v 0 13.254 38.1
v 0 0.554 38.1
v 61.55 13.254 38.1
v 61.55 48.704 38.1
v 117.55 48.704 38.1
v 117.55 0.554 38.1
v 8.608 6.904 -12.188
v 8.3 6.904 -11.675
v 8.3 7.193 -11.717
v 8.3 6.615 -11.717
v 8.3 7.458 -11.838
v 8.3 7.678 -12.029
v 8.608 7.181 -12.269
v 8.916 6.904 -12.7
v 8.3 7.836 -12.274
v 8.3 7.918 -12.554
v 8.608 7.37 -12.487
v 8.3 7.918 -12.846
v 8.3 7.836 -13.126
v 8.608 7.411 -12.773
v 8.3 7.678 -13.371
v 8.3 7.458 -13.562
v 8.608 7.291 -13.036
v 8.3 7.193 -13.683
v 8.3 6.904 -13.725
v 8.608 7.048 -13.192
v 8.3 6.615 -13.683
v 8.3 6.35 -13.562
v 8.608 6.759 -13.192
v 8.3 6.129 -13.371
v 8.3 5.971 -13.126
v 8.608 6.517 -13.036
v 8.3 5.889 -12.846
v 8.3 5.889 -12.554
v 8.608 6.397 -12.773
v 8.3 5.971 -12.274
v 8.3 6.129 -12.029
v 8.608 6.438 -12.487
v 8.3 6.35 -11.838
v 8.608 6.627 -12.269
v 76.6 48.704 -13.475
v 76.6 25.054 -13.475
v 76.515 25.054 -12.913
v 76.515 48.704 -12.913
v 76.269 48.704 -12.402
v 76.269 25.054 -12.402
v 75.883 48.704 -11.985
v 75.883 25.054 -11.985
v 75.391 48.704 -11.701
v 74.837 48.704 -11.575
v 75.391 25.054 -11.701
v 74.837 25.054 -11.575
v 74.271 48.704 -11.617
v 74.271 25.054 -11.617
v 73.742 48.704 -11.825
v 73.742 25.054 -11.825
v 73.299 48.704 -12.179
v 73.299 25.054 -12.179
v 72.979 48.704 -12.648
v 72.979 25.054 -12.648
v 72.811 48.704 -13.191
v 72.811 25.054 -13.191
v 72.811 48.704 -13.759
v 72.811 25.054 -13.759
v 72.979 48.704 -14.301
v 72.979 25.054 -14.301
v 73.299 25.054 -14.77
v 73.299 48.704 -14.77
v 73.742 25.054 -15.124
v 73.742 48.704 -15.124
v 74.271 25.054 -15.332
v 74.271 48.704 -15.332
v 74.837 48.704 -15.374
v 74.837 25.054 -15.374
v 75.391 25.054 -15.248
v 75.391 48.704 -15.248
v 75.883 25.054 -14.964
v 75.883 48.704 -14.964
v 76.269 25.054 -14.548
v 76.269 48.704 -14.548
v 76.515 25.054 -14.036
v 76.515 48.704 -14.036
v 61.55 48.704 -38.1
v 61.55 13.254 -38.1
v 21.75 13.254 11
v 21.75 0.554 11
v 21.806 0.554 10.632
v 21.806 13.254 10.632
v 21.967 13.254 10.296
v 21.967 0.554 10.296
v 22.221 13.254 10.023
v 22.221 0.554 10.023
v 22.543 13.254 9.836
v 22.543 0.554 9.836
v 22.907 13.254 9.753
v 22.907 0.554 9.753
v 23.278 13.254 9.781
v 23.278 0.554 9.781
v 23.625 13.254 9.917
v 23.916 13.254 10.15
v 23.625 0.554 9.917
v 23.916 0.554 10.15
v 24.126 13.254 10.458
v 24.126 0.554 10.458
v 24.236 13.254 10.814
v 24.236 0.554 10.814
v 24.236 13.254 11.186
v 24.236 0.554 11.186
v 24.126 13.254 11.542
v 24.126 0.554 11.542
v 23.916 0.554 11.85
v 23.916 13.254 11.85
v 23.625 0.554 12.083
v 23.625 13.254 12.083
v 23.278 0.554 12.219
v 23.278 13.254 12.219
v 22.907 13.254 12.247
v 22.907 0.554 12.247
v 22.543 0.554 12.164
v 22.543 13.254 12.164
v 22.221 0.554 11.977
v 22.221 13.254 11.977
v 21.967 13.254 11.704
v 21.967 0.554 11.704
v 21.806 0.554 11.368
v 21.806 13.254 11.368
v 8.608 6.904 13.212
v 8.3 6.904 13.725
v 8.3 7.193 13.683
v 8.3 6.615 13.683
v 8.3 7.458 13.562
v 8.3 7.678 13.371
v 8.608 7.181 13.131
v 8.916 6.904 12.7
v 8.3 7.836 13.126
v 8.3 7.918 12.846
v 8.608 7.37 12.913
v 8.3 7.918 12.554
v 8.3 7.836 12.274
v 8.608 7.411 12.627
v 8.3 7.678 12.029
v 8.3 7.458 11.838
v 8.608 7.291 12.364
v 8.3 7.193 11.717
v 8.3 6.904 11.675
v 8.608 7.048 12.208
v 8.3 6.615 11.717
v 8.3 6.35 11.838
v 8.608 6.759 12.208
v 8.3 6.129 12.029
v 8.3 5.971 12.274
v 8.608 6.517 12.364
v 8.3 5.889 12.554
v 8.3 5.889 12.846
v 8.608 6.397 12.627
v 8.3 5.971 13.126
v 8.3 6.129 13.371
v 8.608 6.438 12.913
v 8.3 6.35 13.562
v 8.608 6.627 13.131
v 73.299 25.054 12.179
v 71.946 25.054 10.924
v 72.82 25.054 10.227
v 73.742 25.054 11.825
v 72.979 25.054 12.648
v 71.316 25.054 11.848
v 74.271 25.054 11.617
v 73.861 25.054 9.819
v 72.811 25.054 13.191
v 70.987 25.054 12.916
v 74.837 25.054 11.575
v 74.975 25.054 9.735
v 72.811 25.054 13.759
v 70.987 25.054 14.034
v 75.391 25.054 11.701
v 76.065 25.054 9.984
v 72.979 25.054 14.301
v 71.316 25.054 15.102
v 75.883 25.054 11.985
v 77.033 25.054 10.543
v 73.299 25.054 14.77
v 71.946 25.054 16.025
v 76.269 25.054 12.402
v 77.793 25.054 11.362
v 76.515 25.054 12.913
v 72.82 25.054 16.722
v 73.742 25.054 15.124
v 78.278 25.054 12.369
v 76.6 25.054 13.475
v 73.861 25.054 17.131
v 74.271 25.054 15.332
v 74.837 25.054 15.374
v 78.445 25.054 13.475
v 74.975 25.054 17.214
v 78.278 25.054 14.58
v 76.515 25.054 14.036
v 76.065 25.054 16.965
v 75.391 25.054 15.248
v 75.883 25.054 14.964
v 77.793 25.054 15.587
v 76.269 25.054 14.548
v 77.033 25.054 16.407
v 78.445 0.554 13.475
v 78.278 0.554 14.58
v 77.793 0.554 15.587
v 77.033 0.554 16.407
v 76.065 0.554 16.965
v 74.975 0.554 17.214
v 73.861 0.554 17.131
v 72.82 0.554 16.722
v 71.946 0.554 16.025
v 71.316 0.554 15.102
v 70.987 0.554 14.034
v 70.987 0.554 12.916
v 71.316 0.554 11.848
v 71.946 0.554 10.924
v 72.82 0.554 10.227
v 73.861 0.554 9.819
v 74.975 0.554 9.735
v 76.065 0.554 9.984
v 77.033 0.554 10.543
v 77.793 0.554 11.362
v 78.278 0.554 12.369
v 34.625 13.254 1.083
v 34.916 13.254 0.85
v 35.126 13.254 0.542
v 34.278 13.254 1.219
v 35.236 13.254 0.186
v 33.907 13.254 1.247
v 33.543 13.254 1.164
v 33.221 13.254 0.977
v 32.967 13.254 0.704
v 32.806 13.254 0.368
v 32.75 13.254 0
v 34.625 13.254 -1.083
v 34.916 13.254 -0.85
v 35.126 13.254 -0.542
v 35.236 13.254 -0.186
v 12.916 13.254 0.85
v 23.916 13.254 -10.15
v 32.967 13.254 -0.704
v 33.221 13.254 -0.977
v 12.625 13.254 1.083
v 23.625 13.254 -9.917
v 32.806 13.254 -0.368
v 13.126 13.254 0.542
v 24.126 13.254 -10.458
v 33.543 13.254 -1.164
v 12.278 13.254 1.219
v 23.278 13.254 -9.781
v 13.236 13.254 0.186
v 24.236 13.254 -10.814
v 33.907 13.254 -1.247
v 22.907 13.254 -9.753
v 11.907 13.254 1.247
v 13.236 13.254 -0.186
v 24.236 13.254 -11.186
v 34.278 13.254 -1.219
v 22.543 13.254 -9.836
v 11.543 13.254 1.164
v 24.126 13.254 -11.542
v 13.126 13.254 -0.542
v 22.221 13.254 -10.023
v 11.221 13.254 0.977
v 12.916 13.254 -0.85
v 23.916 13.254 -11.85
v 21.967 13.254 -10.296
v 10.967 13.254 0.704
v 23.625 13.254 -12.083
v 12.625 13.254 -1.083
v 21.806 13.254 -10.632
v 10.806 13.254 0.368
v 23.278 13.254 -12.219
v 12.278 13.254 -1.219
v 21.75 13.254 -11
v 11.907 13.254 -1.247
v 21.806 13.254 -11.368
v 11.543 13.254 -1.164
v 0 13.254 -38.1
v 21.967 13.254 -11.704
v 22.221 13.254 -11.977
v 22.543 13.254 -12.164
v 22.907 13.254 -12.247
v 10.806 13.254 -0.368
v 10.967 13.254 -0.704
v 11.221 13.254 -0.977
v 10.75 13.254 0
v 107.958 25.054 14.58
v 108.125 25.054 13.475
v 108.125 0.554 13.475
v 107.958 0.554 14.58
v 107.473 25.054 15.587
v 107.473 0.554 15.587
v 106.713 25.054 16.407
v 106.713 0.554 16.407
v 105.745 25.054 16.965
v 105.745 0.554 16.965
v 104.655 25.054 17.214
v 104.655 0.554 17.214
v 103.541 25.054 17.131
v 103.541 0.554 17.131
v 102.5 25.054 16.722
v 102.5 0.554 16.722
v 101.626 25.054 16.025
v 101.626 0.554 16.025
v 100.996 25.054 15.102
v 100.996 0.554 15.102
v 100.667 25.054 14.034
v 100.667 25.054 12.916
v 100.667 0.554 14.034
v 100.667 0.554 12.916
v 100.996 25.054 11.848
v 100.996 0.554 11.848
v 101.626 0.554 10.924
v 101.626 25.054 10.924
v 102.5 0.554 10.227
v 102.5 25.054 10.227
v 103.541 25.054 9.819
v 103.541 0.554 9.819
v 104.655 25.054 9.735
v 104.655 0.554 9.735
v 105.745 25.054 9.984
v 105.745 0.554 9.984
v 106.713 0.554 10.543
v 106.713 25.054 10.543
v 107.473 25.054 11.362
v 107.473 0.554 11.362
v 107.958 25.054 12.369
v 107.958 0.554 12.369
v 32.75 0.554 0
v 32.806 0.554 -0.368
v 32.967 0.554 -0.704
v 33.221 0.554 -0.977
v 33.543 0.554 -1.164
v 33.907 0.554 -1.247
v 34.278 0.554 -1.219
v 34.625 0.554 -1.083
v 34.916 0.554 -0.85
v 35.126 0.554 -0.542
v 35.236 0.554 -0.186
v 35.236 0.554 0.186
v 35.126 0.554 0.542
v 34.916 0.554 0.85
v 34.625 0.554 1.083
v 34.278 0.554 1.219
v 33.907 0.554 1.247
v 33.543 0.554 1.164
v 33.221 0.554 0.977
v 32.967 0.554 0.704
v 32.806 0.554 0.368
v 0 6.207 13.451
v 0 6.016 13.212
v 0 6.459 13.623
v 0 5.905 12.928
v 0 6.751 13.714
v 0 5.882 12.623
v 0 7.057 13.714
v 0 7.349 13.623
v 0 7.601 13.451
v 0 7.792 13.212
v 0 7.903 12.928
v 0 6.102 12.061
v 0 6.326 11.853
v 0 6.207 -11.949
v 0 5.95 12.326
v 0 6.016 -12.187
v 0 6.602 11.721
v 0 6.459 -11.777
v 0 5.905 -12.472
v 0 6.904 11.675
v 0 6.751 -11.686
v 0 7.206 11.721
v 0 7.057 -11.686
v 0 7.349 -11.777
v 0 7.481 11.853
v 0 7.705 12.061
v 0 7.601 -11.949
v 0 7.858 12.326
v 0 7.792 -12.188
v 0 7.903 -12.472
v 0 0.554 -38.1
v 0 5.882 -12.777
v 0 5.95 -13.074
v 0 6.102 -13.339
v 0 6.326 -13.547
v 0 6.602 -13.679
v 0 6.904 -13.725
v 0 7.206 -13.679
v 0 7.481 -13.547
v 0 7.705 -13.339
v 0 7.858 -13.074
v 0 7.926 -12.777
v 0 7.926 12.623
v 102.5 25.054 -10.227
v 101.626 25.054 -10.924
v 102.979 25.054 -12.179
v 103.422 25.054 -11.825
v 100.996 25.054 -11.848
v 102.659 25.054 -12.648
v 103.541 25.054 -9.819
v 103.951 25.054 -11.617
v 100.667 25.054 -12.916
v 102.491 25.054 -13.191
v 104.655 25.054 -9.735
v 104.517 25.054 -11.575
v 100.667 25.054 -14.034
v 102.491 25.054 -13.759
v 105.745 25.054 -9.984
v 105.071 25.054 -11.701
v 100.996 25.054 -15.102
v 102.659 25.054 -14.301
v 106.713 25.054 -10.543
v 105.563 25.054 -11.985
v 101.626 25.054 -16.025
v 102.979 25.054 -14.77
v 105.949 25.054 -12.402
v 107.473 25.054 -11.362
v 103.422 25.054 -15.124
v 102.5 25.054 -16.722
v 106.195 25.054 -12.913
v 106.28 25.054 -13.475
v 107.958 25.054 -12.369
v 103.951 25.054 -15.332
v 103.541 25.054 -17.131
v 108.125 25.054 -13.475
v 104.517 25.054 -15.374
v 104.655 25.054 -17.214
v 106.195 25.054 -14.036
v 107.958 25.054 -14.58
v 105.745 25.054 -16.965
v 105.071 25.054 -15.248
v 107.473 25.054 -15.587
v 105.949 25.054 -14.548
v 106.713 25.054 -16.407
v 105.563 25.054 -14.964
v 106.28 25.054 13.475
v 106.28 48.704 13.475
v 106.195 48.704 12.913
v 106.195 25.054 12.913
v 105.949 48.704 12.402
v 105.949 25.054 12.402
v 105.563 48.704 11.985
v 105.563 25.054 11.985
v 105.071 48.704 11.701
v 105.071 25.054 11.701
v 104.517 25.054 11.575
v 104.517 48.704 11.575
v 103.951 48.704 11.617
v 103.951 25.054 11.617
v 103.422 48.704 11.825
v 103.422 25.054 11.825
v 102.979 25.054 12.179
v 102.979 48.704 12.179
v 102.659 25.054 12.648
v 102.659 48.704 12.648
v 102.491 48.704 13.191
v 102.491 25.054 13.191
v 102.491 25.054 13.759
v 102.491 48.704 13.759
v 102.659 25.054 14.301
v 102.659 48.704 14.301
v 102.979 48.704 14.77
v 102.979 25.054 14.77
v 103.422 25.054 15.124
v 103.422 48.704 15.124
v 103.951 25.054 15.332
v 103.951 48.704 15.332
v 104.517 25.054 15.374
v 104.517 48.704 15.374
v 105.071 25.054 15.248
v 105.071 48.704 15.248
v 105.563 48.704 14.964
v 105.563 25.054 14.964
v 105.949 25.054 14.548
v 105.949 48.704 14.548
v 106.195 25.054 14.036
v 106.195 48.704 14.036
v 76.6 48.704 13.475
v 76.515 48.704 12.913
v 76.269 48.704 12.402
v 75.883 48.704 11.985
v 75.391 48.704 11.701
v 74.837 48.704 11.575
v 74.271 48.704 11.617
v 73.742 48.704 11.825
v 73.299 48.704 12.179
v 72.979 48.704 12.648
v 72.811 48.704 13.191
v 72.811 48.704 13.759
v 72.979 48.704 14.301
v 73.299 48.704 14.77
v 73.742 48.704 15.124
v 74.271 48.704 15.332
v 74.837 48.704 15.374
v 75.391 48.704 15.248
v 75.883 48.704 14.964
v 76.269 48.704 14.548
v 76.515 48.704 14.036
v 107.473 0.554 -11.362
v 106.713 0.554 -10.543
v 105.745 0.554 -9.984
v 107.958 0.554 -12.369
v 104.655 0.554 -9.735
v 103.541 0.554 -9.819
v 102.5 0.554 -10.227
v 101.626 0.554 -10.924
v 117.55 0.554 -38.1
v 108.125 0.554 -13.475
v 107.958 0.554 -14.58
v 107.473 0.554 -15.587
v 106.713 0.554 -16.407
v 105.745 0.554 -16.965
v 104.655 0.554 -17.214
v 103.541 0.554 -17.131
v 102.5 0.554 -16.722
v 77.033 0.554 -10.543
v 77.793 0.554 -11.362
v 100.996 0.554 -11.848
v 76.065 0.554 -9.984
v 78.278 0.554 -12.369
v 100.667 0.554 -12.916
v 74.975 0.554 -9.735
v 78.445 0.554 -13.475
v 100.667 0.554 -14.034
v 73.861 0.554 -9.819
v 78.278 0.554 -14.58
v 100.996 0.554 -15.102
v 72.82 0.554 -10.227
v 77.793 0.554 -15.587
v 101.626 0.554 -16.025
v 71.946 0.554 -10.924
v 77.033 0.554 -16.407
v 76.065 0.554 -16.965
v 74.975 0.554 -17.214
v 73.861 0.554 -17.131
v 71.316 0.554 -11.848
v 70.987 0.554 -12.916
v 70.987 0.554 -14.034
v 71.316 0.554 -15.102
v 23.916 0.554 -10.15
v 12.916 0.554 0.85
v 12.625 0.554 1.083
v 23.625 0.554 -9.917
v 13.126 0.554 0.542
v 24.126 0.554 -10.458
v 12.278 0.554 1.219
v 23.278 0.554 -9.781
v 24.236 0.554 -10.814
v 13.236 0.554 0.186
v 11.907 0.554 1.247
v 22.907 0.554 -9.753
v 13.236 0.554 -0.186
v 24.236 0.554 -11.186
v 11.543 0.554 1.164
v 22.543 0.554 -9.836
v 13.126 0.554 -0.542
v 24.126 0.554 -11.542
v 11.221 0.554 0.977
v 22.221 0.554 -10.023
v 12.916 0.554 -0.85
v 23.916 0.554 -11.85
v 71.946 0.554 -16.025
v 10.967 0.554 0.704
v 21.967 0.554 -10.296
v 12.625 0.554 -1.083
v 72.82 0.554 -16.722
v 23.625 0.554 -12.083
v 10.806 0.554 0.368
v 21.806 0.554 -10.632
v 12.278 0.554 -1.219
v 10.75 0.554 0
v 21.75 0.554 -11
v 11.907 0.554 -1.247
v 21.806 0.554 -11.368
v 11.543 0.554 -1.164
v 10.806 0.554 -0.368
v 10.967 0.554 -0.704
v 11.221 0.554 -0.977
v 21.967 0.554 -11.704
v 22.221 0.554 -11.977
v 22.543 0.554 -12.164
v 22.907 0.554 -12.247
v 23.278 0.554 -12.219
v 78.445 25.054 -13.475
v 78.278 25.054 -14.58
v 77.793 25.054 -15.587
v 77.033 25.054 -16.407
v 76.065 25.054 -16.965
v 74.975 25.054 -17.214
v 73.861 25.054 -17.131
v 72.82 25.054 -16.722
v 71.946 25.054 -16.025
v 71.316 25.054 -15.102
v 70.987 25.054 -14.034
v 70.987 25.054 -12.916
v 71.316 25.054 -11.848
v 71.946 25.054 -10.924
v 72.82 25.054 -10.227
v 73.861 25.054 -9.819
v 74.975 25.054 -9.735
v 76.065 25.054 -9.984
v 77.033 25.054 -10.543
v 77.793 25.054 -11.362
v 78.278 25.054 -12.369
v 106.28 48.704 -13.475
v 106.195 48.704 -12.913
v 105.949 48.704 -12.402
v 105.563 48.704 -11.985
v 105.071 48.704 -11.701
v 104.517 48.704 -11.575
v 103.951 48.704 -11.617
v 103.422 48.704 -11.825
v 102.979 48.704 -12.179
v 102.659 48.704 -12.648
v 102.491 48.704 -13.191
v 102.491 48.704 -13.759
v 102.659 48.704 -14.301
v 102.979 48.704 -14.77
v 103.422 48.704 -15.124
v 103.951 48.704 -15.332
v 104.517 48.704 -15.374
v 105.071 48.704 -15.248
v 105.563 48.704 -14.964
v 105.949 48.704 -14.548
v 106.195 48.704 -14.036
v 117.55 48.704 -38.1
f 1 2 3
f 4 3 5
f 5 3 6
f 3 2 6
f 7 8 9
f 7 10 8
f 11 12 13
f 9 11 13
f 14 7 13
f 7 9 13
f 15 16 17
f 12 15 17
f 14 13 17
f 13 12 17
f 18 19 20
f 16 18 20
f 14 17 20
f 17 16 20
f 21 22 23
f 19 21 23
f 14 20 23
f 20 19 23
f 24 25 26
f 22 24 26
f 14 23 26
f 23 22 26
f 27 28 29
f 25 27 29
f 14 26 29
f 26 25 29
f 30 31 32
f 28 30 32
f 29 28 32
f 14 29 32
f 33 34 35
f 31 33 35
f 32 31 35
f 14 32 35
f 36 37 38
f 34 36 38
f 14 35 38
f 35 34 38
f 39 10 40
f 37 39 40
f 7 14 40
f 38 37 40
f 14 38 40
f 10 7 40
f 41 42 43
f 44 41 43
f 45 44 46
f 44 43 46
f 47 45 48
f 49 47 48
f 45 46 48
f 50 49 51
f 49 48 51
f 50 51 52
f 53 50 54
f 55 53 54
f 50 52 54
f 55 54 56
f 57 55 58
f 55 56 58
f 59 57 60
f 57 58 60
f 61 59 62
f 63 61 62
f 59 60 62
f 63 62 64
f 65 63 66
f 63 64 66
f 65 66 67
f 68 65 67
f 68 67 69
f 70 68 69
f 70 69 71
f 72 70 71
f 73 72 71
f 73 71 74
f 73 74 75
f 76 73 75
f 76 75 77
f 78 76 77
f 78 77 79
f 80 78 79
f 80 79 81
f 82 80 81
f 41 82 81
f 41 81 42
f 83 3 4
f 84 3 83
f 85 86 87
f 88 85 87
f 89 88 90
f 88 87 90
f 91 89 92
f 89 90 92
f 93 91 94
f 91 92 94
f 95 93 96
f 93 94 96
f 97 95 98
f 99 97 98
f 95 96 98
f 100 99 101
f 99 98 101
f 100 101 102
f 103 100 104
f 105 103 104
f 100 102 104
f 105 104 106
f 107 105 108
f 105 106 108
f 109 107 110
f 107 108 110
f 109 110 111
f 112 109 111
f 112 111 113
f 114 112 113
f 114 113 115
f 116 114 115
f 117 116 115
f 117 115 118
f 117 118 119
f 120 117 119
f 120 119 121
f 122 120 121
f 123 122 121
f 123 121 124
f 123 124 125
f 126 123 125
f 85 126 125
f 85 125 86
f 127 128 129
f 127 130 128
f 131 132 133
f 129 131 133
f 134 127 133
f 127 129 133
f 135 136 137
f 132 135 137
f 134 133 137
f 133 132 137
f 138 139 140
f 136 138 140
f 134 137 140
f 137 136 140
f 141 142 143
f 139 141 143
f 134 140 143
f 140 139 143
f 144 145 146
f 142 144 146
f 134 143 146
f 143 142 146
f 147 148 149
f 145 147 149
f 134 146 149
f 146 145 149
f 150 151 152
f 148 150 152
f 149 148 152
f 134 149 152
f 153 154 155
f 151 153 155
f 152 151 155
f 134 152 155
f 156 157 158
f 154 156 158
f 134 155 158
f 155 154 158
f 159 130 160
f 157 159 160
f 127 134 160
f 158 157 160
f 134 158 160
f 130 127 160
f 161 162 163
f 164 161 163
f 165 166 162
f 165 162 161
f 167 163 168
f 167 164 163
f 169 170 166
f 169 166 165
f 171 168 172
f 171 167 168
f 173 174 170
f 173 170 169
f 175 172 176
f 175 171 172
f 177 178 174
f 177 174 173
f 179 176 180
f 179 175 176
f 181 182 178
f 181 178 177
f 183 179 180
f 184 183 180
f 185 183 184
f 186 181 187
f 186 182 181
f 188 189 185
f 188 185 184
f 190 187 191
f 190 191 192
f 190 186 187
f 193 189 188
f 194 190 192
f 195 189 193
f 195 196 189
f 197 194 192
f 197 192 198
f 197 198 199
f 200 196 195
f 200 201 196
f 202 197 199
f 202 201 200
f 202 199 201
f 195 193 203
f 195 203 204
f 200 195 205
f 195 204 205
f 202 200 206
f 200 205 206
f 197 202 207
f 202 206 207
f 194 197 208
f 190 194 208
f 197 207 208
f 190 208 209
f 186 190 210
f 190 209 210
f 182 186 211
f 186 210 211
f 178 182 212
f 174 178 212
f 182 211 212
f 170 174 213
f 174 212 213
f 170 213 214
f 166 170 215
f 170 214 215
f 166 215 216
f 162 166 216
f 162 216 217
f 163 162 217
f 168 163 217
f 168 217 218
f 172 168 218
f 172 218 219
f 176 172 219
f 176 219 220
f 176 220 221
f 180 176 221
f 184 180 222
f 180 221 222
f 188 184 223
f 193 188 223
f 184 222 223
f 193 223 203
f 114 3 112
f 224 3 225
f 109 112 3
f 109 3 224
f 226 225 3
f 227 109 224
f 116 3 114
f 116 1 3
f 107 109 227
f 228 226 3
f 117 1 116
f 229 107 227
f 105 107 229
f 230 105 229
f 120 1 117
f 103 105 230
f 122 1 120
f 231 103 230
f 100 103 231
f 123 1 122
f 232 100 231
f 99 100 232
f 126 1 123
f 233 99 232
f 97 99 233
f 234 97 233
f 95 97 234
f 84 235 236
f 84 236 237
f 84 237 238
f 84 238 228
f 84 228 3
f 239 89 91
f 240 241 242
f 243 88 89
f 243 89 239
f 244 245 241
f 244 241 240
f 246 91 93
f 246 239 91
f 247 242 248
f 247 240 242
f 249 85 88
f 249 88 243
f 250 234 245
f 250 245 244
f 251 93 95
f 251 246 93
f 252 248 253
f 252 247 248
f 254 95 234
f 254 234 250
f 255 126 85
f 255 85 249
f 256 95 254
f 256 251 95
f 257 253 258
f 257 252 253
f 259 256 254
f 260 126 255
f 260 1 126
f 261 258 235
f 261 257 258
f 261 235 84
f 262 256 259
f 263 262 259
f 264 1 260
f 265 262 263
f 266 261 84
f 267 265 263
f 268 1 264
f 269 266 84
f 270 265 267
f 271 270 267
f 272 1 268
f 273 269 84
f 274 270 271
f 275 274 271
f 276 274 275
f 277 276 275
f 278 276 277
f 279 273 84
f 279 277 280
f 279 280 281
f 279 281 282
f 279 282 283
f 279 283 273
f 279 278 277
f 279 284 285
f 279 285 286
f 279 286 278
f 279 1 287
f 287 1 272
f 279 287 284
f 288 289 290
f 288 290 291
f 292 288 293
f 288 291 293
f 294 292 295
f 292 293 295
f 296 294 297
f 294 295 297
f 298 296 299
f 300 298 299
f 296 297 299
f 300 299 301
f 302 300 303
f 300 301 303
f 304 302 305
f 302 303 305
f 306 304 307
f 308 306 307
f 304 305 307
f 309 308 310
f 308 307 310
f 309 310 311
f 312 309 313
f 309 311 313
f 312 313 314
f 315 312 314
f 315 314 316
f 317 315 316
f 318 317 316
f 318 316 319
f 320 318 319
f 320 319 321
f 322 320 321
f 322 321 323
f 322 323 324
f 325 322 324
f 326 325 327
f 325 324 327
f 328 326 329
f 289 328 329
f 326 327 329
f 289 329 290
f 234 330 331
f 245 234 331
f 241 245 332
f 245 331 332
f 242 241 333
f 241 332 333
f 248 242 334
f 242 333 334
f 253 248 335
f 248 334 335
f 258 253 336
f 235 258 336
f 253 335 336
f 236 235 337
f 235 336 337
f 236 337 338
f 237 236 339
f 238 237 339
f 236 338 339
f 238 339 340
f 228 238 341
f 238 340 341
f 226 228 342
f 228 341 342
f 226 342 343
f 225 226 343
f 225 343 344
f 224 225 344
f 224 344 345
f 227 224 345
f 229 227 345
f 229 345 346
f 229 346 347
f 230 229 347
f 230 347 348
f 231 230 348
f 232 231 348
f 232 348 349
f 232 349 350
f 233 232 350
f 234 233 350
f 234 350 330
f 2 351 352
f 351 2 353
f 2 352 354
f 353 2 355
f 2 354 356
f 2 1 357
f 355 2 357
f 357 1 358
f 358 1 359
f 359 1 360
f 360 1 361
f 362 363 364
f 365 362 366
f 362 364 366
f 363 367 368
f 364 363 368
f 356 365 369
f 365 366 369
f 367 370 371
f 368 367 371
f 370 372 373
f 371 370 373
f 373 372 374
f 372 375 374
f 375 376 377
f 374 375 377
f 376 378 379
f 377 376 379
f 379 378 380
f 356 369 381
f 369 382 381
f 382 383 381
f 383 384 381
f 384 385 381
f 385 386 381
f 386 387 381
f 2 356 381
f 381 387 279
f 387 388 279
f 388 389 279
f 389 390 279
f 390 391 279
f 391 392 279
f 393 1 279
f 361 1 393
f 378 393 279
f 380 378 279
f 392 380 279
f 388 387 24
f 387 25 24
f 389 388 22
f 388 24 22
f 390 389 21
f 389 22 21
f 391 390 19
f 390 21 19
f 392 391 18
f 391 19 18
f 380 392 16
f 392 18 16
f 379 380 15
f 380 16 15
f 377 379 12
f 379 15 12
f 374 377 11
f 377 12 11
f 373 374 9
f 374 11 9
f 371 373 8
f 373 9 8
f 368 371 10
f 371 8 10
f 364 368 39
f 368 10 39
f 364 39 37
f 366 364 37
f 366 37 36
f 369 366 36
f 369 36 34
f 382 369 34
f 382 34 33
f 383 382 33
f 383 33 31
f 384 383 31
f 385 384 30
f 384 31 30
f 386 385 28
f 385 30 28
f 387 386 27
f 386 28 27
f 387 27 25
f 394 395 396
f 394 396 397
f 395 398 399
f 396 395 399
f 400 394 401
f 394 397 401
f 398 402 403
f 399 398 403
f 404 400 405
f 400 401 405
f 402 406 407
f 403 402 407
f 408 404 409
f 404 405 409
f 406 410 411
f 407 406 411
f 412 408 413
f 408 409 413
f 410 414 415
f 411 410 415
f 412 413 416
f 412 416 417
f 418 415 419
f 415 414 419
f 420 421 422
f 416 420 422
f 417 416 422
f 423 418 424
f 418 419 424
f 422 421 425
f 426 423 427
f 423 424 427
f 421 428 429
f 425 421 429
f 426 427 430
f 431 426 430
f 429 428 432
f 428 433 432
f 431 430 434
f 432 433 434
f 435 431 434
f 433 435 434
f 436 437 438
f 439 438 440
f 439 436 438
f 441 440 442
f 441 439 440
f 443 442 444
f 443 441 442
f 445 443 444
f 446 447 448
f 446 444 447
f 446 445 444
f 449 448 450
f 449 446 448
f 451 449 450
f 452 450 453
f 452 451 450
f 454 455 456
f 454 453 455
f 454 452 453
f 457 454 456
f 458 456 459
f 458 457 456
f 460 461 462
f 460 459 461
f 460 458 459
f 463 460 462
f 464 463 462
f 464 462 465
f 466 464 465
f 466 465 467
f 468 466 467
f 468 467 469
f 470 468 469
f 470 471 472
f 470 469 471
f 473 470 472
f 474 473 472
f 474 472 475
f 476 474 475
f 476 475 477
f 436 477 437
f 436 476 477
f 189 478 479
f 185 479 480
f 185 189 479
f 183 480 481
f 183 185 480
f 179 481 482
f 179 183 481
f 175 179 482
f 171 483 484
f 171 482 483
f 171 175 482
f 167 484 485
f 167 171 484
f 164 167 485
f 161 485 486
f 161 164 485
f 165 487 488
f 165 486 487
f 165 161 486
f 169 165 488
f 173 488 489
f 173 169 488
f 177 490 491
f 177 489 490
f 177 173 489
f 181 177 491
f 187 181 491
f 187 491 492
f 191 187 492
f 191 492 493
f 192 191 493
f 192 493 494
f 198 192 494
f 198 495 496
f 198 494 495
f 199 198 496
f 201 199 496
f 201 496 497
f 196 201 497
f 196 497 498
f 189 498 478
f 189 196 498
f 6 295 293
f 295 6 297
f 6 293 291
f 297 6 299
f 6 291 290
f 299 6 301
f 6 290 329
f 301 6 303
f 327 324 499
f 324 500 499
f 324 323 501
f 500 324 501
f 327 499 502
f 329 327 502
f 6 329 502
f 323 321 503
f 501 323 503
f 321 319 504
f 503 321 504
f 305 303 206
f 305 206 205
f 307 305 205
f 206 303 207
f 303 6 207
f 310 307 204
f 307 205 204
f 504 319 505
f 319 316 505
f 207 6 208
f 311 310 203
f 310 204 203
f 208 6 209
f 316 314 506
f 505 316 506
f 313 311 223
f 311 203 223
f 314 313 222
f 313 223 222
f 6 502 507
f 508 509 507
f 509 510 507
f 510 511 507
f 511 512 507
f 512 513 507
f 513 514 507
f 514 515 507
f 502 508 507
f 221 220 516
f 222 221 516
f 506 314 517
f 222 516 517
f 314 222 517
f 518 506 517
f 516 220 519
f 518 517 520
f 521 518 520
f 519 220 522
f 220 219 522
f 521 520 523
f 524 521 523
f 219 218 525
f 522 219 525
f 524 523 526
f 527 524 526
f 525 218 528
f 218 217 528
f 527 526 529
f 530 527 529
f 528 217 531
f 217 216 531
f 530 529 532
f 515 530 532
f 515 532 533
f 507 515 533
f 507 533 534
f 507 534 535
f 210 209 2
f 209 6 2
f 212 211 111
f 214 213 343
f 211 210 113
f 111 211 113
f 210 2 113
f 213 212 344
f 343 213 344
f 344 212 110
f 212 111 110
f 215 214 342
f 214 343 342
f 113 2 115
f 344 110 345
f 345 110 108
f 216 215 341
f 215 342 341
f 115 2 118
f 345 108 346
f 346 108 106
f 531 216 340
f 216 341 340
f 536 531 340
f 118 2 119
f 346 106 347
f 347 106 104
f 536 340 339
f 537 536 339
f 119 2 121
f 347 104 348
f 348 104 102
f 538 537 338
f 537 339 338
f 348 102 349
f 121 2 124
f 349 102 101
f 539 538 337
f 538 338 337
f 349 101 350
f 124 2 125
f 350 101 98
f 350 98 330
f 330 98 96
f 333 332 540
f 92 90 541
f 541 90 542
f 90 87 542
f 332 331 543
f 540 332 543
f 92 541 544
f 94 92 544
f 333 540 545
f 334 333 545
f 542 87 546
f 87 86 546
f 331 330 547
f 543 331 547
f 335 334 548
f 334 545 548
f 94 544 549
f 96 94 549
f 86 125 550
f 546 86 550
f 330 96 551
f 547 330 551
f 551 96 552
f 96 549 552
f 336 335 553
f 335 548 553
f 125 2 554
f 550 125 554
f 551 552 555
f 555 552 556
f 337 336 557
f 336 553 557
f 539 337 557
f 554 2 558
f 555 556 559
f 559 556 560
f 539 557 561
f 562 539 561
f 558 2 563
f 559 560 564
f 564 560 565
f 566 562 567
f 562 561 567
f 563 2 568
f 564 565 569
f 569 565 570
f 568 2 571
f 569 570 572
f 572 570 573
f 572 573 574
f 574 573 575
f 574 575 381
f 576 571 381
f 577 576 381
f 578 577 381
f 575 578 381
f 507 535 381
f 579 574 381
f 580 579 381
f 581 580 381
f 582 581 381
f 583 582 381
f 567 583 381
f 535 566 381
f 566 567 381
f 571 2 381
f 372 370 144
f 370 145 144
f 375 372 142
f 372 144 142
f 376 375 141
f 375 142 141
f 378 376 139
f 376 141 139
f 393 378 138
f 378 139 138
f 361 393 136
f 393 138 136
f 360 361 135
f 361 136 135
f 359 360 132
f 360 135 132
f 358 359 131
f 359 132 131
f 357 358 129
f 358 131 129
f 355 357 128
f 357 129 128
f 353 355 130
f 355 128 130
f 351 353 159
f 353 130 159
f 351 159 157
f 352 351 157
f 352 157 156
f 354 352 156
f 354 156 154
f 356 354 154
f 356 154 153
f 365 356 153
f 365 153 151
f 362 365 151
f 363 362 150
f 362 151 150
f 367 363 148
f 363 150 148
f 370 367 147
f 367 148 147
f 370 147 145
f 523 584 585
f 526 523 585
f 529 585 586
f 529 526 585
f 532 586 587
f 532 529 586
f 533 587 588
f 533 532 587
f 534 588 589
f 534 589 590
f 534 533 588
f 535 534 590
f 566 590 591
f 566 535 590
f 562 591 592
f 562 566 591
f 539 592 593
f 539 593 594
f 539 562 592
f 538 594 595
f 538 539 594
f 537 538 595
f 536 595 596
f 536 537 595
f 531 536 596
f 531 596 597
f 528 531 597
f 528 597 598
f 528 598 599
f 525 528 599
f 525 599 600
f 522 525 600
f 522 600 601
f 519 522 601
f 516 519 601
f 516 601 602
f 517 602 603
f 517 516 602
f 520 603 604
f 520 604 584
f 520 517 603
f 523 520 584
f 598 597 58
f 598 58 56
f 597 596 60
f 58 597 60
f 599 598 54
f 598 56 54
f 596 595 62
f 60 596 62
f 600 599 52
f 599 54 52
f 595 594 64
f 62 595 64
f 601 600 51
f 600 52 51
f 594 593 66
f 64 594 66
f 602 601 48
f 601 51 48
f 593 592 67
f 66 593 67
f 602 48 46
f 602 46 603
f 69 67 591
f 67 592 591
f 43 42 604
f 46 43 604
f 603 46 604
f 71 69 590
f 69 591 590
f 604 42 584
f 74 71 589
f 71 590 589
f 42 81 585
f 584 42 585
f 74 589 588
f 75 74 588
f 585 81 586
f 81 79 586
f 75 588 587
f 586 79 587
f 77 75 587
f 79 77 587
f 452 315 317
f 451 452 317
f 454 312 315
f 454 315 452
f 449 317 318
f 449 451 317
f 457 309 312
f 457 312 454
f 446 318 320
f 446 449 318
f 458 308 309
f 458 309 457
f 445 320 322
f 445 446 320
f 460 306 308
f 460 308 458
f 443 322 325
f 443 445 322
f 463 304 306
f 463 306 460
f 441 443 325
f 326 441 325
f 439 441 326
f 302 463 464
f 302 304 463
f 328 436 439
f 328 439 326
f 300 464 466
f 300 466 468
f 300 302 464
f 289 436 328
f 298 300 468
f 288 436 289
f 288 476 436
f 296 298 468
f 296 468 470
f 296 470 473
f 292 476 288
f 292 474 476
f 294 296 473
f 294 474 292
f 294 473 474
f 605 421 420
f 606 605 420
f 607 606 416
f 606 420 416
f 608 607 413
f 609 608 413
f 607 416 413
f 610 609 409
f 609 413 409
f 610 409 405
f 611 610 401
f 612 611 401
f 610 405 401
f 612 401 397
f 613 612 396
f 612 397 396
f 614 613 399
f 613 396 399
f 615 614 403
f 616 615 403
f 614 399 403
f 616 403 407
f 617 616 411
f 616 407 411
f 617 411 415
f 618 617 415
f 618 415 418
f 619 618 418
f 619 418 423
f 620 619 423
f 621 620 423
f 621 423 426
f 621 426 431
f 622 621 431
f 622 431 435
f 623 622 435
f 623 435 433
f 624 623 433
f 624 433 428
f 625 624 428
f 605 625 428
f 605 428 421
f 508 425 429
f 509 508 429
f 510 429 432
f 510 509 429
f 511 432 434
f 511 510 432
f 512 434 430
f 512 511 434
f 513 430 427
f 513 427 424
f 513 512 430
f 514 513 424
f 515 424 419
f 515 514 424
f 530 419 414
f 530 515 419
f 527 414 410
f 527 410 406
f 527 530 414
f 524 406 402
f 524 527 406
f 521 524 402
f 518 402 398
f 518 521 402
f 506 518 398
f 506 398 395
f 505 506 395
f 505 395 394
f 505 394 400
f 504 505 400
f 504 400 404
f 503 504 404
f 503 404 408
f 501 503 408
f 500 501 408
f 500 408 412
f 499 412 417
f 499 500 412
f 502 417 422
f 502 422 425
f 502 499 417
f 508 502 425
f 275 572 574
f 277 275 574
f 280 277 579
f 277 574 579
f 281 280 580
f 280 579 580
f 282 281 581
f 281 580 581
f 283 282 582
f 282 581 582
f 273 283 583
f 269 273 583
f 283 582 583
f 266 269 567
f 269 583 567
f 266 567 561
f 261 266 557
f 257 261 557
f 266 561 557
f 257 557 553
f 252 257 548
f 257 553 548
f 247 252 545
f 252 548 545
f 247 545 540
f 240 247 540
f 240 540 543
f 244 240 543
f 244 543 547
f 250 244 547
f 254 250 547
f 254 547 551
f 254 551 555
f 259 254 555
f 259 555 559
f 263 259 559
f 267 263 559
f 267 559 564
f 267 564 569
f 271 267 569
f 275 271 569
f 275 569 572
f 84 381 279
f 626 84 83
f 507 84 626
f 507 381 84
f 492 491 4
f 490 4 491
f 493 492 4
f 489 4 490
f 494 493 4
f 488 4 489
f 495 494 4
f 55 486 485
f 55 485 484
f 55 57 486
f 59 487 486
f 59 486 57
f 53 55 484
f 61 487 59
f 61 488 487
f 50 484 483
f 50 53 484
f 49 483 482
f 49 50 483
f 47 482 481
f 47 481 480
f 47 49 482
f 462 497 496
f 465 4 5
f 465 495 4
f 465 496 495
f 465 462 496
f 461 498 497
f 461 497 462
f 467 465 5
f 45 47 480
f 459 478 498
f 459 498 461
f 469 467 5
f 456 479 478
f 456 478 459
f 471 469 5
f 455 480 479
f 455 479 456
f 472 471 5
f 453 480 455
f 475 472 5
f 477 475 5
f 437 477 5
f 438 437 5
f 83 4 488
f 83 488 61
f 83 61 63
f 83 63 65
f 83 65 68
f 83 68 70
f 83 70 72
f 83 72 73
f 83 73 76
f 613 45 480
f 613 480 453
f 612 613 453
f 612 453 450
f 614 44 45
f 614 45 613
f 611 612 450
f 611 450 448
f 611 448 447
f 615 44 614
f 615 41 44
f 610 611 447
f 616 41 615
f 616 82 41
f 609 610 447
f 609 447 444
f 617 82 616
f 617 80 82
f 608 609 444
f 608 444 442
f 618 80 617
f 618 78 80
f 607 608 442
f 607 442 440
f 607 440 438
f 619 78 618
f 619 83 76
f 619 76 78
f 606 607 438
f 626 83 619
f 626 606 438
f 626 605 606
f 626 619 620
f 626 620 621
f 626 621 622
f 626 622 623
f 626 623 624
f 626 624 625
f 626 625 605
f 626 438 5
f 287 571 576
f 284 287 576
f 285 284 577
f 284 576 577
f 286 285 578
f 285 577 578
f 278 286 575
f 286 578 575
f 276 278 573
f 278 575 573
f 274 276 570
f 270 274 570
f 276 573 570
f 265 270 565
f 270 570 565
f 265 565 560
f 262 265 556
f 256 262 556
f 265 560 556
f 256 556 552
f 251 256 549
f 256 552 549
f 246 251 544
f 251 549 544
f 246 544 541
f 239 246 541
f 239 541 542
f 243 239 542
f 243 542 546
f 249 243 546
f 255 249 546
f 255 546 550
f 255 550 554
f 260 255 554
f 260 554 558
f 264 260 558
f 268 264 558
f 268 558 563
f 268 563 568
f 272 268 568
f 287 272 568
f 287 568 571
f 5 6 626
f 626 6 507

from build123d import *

# Parameters (mm, degrees)
SKETCH1_W                          = 76.2
SKETCH1_H                          = 12.7
BOSS_EXTRUDE1_DEPTH                = 117.55
F_2_5MM_DOWEL_HOLE2_D              = 2.5
SKETCH13_W                         = 56
SKETCH13_H                         = 76.2
BOSS_EXTRUDE3_DEPTH                = 35.45
SKETCH11_R                         = 3.75
CUT_EXTRUDE3_DEPTH                 = 24.5
SKETCH14_R                         = 1.905
CUT_EXTRUDE4_DEPTH                 = 24.65
TAP_DRILL_FOR_M2_5X0_45_TAP1_D     = 2.05
TAP_DRILL_FOR_M2_5X0_45_TAP1_DEPTH = 8.3
TAP_DRILL_FOR_M2_5X0_45_TAP1_TIP   = 0.615882135


with BuildPart() as part:
    # Sketch1 → Boss-Extrude1 (new body)
    with BuildSketch(Plane(origin=(0, 0, 0), x_dir=(0, 0, -1), z_dir=(1, 0, 0))):
        with Locations((0, 6.903854155)):
            Rectangle(SKETCH1_W, SKETCH1_H)
    extrude(amount=BOSS_EXTRUDE1_DEPTH)

    # Ø2.5mm Dowel Hole2 (through all)
    with Locations(Plane(origin=(0, 13.253854155, 0), x_dir=(1, 0, 0), z_dir=(0, 1, 0))):
        with Locations((12, 0), (34, 0), (23, -11), (23, 11)):
            Hole(F_2_5MM_DOWEL_HOLE2_D / 2)

    # Sketch13 → Boss-Extrude3 (add)
    with BuildSketch(Plane(origin=(0, 13.253854155, 0), x_dir=(1, 0, 0), z_dir=(0, 1, 0))):
        with Locations((89.55, 0)):
            Rectangle(SKETCH13_W, SKETCH13_H)
    extrude(amount=BOSS_EXTRUDE3_DEPTH)

    # Sketch11 → Cut-Extrude3 (cut)
    with BuildSketch(Plane(origin=(0, 0.553854155, 0), x_dir=(1, 0, 0), z_dir=(0, 1, 0))):
        with Locations((104.375, 13.4747)):
            Circle(SKETCH11_R)
        with Locations((74.695, 13.4747)):
            Circle(SKETCH11_R)
    cut_extrude3 = extrude(amount=CUT_EXTRUDE3_DEPTH, mode=Mode.SUBTRACT)

    # Sketch14 → Cut-Extrude4 (cut, through all)
    with BuildSketch(Plane.XZ.offset(-25.053854155)):
        with Locations((104.375, -13.4747)):
            Circle(SKETCH14_R)
        with Locations((74.695, -13.4747)):
            Circle(SKETCH14_R)
    cut_extrude4 = extrude(amount=-CUT_EXTRUDE4_DEPTH, mode=Mode.SUBTRACT)

    # Mirror2: Cut-Extrude3, Cut-Extrude4 across plane
    add(cut_extrude3.mirror(Plane.XY), mode=Mode.SUBTRACT)
    add(cut_extrude4.mirror(Plane.XY), mode=Mode.SUBTRACT)

    # Tap Drill for M2.5x0.45 Tap1
    with Locations(Plane.ZY):
        with Locations((-12.7, 6.903854155), (12.7, 6.903854155)):
            Hole(TAP_DRILL_FOR_M2_5X0_45_TAP1_D / 2, depth=TAP_DRILL_FOR_M2_5X0_45_TAP1_DEPTH)
            with Locations((0, 0, -(TAP_DRILL_FOR_M2_5X0_45_TAP1_DEPTH + TAP_DRILL_FOR_M2_5X0_45_TAP1_TIP / 2))):  # 118° drill point
                Cone(0, TAP_DRILL_FOR_M2_5X0_45_TAP1_D / 2, TAP_DRILL_FOR_M2_5X0_45_TAP1_TIP, mode=Mode.SUBTRACT)


solid = part.part
